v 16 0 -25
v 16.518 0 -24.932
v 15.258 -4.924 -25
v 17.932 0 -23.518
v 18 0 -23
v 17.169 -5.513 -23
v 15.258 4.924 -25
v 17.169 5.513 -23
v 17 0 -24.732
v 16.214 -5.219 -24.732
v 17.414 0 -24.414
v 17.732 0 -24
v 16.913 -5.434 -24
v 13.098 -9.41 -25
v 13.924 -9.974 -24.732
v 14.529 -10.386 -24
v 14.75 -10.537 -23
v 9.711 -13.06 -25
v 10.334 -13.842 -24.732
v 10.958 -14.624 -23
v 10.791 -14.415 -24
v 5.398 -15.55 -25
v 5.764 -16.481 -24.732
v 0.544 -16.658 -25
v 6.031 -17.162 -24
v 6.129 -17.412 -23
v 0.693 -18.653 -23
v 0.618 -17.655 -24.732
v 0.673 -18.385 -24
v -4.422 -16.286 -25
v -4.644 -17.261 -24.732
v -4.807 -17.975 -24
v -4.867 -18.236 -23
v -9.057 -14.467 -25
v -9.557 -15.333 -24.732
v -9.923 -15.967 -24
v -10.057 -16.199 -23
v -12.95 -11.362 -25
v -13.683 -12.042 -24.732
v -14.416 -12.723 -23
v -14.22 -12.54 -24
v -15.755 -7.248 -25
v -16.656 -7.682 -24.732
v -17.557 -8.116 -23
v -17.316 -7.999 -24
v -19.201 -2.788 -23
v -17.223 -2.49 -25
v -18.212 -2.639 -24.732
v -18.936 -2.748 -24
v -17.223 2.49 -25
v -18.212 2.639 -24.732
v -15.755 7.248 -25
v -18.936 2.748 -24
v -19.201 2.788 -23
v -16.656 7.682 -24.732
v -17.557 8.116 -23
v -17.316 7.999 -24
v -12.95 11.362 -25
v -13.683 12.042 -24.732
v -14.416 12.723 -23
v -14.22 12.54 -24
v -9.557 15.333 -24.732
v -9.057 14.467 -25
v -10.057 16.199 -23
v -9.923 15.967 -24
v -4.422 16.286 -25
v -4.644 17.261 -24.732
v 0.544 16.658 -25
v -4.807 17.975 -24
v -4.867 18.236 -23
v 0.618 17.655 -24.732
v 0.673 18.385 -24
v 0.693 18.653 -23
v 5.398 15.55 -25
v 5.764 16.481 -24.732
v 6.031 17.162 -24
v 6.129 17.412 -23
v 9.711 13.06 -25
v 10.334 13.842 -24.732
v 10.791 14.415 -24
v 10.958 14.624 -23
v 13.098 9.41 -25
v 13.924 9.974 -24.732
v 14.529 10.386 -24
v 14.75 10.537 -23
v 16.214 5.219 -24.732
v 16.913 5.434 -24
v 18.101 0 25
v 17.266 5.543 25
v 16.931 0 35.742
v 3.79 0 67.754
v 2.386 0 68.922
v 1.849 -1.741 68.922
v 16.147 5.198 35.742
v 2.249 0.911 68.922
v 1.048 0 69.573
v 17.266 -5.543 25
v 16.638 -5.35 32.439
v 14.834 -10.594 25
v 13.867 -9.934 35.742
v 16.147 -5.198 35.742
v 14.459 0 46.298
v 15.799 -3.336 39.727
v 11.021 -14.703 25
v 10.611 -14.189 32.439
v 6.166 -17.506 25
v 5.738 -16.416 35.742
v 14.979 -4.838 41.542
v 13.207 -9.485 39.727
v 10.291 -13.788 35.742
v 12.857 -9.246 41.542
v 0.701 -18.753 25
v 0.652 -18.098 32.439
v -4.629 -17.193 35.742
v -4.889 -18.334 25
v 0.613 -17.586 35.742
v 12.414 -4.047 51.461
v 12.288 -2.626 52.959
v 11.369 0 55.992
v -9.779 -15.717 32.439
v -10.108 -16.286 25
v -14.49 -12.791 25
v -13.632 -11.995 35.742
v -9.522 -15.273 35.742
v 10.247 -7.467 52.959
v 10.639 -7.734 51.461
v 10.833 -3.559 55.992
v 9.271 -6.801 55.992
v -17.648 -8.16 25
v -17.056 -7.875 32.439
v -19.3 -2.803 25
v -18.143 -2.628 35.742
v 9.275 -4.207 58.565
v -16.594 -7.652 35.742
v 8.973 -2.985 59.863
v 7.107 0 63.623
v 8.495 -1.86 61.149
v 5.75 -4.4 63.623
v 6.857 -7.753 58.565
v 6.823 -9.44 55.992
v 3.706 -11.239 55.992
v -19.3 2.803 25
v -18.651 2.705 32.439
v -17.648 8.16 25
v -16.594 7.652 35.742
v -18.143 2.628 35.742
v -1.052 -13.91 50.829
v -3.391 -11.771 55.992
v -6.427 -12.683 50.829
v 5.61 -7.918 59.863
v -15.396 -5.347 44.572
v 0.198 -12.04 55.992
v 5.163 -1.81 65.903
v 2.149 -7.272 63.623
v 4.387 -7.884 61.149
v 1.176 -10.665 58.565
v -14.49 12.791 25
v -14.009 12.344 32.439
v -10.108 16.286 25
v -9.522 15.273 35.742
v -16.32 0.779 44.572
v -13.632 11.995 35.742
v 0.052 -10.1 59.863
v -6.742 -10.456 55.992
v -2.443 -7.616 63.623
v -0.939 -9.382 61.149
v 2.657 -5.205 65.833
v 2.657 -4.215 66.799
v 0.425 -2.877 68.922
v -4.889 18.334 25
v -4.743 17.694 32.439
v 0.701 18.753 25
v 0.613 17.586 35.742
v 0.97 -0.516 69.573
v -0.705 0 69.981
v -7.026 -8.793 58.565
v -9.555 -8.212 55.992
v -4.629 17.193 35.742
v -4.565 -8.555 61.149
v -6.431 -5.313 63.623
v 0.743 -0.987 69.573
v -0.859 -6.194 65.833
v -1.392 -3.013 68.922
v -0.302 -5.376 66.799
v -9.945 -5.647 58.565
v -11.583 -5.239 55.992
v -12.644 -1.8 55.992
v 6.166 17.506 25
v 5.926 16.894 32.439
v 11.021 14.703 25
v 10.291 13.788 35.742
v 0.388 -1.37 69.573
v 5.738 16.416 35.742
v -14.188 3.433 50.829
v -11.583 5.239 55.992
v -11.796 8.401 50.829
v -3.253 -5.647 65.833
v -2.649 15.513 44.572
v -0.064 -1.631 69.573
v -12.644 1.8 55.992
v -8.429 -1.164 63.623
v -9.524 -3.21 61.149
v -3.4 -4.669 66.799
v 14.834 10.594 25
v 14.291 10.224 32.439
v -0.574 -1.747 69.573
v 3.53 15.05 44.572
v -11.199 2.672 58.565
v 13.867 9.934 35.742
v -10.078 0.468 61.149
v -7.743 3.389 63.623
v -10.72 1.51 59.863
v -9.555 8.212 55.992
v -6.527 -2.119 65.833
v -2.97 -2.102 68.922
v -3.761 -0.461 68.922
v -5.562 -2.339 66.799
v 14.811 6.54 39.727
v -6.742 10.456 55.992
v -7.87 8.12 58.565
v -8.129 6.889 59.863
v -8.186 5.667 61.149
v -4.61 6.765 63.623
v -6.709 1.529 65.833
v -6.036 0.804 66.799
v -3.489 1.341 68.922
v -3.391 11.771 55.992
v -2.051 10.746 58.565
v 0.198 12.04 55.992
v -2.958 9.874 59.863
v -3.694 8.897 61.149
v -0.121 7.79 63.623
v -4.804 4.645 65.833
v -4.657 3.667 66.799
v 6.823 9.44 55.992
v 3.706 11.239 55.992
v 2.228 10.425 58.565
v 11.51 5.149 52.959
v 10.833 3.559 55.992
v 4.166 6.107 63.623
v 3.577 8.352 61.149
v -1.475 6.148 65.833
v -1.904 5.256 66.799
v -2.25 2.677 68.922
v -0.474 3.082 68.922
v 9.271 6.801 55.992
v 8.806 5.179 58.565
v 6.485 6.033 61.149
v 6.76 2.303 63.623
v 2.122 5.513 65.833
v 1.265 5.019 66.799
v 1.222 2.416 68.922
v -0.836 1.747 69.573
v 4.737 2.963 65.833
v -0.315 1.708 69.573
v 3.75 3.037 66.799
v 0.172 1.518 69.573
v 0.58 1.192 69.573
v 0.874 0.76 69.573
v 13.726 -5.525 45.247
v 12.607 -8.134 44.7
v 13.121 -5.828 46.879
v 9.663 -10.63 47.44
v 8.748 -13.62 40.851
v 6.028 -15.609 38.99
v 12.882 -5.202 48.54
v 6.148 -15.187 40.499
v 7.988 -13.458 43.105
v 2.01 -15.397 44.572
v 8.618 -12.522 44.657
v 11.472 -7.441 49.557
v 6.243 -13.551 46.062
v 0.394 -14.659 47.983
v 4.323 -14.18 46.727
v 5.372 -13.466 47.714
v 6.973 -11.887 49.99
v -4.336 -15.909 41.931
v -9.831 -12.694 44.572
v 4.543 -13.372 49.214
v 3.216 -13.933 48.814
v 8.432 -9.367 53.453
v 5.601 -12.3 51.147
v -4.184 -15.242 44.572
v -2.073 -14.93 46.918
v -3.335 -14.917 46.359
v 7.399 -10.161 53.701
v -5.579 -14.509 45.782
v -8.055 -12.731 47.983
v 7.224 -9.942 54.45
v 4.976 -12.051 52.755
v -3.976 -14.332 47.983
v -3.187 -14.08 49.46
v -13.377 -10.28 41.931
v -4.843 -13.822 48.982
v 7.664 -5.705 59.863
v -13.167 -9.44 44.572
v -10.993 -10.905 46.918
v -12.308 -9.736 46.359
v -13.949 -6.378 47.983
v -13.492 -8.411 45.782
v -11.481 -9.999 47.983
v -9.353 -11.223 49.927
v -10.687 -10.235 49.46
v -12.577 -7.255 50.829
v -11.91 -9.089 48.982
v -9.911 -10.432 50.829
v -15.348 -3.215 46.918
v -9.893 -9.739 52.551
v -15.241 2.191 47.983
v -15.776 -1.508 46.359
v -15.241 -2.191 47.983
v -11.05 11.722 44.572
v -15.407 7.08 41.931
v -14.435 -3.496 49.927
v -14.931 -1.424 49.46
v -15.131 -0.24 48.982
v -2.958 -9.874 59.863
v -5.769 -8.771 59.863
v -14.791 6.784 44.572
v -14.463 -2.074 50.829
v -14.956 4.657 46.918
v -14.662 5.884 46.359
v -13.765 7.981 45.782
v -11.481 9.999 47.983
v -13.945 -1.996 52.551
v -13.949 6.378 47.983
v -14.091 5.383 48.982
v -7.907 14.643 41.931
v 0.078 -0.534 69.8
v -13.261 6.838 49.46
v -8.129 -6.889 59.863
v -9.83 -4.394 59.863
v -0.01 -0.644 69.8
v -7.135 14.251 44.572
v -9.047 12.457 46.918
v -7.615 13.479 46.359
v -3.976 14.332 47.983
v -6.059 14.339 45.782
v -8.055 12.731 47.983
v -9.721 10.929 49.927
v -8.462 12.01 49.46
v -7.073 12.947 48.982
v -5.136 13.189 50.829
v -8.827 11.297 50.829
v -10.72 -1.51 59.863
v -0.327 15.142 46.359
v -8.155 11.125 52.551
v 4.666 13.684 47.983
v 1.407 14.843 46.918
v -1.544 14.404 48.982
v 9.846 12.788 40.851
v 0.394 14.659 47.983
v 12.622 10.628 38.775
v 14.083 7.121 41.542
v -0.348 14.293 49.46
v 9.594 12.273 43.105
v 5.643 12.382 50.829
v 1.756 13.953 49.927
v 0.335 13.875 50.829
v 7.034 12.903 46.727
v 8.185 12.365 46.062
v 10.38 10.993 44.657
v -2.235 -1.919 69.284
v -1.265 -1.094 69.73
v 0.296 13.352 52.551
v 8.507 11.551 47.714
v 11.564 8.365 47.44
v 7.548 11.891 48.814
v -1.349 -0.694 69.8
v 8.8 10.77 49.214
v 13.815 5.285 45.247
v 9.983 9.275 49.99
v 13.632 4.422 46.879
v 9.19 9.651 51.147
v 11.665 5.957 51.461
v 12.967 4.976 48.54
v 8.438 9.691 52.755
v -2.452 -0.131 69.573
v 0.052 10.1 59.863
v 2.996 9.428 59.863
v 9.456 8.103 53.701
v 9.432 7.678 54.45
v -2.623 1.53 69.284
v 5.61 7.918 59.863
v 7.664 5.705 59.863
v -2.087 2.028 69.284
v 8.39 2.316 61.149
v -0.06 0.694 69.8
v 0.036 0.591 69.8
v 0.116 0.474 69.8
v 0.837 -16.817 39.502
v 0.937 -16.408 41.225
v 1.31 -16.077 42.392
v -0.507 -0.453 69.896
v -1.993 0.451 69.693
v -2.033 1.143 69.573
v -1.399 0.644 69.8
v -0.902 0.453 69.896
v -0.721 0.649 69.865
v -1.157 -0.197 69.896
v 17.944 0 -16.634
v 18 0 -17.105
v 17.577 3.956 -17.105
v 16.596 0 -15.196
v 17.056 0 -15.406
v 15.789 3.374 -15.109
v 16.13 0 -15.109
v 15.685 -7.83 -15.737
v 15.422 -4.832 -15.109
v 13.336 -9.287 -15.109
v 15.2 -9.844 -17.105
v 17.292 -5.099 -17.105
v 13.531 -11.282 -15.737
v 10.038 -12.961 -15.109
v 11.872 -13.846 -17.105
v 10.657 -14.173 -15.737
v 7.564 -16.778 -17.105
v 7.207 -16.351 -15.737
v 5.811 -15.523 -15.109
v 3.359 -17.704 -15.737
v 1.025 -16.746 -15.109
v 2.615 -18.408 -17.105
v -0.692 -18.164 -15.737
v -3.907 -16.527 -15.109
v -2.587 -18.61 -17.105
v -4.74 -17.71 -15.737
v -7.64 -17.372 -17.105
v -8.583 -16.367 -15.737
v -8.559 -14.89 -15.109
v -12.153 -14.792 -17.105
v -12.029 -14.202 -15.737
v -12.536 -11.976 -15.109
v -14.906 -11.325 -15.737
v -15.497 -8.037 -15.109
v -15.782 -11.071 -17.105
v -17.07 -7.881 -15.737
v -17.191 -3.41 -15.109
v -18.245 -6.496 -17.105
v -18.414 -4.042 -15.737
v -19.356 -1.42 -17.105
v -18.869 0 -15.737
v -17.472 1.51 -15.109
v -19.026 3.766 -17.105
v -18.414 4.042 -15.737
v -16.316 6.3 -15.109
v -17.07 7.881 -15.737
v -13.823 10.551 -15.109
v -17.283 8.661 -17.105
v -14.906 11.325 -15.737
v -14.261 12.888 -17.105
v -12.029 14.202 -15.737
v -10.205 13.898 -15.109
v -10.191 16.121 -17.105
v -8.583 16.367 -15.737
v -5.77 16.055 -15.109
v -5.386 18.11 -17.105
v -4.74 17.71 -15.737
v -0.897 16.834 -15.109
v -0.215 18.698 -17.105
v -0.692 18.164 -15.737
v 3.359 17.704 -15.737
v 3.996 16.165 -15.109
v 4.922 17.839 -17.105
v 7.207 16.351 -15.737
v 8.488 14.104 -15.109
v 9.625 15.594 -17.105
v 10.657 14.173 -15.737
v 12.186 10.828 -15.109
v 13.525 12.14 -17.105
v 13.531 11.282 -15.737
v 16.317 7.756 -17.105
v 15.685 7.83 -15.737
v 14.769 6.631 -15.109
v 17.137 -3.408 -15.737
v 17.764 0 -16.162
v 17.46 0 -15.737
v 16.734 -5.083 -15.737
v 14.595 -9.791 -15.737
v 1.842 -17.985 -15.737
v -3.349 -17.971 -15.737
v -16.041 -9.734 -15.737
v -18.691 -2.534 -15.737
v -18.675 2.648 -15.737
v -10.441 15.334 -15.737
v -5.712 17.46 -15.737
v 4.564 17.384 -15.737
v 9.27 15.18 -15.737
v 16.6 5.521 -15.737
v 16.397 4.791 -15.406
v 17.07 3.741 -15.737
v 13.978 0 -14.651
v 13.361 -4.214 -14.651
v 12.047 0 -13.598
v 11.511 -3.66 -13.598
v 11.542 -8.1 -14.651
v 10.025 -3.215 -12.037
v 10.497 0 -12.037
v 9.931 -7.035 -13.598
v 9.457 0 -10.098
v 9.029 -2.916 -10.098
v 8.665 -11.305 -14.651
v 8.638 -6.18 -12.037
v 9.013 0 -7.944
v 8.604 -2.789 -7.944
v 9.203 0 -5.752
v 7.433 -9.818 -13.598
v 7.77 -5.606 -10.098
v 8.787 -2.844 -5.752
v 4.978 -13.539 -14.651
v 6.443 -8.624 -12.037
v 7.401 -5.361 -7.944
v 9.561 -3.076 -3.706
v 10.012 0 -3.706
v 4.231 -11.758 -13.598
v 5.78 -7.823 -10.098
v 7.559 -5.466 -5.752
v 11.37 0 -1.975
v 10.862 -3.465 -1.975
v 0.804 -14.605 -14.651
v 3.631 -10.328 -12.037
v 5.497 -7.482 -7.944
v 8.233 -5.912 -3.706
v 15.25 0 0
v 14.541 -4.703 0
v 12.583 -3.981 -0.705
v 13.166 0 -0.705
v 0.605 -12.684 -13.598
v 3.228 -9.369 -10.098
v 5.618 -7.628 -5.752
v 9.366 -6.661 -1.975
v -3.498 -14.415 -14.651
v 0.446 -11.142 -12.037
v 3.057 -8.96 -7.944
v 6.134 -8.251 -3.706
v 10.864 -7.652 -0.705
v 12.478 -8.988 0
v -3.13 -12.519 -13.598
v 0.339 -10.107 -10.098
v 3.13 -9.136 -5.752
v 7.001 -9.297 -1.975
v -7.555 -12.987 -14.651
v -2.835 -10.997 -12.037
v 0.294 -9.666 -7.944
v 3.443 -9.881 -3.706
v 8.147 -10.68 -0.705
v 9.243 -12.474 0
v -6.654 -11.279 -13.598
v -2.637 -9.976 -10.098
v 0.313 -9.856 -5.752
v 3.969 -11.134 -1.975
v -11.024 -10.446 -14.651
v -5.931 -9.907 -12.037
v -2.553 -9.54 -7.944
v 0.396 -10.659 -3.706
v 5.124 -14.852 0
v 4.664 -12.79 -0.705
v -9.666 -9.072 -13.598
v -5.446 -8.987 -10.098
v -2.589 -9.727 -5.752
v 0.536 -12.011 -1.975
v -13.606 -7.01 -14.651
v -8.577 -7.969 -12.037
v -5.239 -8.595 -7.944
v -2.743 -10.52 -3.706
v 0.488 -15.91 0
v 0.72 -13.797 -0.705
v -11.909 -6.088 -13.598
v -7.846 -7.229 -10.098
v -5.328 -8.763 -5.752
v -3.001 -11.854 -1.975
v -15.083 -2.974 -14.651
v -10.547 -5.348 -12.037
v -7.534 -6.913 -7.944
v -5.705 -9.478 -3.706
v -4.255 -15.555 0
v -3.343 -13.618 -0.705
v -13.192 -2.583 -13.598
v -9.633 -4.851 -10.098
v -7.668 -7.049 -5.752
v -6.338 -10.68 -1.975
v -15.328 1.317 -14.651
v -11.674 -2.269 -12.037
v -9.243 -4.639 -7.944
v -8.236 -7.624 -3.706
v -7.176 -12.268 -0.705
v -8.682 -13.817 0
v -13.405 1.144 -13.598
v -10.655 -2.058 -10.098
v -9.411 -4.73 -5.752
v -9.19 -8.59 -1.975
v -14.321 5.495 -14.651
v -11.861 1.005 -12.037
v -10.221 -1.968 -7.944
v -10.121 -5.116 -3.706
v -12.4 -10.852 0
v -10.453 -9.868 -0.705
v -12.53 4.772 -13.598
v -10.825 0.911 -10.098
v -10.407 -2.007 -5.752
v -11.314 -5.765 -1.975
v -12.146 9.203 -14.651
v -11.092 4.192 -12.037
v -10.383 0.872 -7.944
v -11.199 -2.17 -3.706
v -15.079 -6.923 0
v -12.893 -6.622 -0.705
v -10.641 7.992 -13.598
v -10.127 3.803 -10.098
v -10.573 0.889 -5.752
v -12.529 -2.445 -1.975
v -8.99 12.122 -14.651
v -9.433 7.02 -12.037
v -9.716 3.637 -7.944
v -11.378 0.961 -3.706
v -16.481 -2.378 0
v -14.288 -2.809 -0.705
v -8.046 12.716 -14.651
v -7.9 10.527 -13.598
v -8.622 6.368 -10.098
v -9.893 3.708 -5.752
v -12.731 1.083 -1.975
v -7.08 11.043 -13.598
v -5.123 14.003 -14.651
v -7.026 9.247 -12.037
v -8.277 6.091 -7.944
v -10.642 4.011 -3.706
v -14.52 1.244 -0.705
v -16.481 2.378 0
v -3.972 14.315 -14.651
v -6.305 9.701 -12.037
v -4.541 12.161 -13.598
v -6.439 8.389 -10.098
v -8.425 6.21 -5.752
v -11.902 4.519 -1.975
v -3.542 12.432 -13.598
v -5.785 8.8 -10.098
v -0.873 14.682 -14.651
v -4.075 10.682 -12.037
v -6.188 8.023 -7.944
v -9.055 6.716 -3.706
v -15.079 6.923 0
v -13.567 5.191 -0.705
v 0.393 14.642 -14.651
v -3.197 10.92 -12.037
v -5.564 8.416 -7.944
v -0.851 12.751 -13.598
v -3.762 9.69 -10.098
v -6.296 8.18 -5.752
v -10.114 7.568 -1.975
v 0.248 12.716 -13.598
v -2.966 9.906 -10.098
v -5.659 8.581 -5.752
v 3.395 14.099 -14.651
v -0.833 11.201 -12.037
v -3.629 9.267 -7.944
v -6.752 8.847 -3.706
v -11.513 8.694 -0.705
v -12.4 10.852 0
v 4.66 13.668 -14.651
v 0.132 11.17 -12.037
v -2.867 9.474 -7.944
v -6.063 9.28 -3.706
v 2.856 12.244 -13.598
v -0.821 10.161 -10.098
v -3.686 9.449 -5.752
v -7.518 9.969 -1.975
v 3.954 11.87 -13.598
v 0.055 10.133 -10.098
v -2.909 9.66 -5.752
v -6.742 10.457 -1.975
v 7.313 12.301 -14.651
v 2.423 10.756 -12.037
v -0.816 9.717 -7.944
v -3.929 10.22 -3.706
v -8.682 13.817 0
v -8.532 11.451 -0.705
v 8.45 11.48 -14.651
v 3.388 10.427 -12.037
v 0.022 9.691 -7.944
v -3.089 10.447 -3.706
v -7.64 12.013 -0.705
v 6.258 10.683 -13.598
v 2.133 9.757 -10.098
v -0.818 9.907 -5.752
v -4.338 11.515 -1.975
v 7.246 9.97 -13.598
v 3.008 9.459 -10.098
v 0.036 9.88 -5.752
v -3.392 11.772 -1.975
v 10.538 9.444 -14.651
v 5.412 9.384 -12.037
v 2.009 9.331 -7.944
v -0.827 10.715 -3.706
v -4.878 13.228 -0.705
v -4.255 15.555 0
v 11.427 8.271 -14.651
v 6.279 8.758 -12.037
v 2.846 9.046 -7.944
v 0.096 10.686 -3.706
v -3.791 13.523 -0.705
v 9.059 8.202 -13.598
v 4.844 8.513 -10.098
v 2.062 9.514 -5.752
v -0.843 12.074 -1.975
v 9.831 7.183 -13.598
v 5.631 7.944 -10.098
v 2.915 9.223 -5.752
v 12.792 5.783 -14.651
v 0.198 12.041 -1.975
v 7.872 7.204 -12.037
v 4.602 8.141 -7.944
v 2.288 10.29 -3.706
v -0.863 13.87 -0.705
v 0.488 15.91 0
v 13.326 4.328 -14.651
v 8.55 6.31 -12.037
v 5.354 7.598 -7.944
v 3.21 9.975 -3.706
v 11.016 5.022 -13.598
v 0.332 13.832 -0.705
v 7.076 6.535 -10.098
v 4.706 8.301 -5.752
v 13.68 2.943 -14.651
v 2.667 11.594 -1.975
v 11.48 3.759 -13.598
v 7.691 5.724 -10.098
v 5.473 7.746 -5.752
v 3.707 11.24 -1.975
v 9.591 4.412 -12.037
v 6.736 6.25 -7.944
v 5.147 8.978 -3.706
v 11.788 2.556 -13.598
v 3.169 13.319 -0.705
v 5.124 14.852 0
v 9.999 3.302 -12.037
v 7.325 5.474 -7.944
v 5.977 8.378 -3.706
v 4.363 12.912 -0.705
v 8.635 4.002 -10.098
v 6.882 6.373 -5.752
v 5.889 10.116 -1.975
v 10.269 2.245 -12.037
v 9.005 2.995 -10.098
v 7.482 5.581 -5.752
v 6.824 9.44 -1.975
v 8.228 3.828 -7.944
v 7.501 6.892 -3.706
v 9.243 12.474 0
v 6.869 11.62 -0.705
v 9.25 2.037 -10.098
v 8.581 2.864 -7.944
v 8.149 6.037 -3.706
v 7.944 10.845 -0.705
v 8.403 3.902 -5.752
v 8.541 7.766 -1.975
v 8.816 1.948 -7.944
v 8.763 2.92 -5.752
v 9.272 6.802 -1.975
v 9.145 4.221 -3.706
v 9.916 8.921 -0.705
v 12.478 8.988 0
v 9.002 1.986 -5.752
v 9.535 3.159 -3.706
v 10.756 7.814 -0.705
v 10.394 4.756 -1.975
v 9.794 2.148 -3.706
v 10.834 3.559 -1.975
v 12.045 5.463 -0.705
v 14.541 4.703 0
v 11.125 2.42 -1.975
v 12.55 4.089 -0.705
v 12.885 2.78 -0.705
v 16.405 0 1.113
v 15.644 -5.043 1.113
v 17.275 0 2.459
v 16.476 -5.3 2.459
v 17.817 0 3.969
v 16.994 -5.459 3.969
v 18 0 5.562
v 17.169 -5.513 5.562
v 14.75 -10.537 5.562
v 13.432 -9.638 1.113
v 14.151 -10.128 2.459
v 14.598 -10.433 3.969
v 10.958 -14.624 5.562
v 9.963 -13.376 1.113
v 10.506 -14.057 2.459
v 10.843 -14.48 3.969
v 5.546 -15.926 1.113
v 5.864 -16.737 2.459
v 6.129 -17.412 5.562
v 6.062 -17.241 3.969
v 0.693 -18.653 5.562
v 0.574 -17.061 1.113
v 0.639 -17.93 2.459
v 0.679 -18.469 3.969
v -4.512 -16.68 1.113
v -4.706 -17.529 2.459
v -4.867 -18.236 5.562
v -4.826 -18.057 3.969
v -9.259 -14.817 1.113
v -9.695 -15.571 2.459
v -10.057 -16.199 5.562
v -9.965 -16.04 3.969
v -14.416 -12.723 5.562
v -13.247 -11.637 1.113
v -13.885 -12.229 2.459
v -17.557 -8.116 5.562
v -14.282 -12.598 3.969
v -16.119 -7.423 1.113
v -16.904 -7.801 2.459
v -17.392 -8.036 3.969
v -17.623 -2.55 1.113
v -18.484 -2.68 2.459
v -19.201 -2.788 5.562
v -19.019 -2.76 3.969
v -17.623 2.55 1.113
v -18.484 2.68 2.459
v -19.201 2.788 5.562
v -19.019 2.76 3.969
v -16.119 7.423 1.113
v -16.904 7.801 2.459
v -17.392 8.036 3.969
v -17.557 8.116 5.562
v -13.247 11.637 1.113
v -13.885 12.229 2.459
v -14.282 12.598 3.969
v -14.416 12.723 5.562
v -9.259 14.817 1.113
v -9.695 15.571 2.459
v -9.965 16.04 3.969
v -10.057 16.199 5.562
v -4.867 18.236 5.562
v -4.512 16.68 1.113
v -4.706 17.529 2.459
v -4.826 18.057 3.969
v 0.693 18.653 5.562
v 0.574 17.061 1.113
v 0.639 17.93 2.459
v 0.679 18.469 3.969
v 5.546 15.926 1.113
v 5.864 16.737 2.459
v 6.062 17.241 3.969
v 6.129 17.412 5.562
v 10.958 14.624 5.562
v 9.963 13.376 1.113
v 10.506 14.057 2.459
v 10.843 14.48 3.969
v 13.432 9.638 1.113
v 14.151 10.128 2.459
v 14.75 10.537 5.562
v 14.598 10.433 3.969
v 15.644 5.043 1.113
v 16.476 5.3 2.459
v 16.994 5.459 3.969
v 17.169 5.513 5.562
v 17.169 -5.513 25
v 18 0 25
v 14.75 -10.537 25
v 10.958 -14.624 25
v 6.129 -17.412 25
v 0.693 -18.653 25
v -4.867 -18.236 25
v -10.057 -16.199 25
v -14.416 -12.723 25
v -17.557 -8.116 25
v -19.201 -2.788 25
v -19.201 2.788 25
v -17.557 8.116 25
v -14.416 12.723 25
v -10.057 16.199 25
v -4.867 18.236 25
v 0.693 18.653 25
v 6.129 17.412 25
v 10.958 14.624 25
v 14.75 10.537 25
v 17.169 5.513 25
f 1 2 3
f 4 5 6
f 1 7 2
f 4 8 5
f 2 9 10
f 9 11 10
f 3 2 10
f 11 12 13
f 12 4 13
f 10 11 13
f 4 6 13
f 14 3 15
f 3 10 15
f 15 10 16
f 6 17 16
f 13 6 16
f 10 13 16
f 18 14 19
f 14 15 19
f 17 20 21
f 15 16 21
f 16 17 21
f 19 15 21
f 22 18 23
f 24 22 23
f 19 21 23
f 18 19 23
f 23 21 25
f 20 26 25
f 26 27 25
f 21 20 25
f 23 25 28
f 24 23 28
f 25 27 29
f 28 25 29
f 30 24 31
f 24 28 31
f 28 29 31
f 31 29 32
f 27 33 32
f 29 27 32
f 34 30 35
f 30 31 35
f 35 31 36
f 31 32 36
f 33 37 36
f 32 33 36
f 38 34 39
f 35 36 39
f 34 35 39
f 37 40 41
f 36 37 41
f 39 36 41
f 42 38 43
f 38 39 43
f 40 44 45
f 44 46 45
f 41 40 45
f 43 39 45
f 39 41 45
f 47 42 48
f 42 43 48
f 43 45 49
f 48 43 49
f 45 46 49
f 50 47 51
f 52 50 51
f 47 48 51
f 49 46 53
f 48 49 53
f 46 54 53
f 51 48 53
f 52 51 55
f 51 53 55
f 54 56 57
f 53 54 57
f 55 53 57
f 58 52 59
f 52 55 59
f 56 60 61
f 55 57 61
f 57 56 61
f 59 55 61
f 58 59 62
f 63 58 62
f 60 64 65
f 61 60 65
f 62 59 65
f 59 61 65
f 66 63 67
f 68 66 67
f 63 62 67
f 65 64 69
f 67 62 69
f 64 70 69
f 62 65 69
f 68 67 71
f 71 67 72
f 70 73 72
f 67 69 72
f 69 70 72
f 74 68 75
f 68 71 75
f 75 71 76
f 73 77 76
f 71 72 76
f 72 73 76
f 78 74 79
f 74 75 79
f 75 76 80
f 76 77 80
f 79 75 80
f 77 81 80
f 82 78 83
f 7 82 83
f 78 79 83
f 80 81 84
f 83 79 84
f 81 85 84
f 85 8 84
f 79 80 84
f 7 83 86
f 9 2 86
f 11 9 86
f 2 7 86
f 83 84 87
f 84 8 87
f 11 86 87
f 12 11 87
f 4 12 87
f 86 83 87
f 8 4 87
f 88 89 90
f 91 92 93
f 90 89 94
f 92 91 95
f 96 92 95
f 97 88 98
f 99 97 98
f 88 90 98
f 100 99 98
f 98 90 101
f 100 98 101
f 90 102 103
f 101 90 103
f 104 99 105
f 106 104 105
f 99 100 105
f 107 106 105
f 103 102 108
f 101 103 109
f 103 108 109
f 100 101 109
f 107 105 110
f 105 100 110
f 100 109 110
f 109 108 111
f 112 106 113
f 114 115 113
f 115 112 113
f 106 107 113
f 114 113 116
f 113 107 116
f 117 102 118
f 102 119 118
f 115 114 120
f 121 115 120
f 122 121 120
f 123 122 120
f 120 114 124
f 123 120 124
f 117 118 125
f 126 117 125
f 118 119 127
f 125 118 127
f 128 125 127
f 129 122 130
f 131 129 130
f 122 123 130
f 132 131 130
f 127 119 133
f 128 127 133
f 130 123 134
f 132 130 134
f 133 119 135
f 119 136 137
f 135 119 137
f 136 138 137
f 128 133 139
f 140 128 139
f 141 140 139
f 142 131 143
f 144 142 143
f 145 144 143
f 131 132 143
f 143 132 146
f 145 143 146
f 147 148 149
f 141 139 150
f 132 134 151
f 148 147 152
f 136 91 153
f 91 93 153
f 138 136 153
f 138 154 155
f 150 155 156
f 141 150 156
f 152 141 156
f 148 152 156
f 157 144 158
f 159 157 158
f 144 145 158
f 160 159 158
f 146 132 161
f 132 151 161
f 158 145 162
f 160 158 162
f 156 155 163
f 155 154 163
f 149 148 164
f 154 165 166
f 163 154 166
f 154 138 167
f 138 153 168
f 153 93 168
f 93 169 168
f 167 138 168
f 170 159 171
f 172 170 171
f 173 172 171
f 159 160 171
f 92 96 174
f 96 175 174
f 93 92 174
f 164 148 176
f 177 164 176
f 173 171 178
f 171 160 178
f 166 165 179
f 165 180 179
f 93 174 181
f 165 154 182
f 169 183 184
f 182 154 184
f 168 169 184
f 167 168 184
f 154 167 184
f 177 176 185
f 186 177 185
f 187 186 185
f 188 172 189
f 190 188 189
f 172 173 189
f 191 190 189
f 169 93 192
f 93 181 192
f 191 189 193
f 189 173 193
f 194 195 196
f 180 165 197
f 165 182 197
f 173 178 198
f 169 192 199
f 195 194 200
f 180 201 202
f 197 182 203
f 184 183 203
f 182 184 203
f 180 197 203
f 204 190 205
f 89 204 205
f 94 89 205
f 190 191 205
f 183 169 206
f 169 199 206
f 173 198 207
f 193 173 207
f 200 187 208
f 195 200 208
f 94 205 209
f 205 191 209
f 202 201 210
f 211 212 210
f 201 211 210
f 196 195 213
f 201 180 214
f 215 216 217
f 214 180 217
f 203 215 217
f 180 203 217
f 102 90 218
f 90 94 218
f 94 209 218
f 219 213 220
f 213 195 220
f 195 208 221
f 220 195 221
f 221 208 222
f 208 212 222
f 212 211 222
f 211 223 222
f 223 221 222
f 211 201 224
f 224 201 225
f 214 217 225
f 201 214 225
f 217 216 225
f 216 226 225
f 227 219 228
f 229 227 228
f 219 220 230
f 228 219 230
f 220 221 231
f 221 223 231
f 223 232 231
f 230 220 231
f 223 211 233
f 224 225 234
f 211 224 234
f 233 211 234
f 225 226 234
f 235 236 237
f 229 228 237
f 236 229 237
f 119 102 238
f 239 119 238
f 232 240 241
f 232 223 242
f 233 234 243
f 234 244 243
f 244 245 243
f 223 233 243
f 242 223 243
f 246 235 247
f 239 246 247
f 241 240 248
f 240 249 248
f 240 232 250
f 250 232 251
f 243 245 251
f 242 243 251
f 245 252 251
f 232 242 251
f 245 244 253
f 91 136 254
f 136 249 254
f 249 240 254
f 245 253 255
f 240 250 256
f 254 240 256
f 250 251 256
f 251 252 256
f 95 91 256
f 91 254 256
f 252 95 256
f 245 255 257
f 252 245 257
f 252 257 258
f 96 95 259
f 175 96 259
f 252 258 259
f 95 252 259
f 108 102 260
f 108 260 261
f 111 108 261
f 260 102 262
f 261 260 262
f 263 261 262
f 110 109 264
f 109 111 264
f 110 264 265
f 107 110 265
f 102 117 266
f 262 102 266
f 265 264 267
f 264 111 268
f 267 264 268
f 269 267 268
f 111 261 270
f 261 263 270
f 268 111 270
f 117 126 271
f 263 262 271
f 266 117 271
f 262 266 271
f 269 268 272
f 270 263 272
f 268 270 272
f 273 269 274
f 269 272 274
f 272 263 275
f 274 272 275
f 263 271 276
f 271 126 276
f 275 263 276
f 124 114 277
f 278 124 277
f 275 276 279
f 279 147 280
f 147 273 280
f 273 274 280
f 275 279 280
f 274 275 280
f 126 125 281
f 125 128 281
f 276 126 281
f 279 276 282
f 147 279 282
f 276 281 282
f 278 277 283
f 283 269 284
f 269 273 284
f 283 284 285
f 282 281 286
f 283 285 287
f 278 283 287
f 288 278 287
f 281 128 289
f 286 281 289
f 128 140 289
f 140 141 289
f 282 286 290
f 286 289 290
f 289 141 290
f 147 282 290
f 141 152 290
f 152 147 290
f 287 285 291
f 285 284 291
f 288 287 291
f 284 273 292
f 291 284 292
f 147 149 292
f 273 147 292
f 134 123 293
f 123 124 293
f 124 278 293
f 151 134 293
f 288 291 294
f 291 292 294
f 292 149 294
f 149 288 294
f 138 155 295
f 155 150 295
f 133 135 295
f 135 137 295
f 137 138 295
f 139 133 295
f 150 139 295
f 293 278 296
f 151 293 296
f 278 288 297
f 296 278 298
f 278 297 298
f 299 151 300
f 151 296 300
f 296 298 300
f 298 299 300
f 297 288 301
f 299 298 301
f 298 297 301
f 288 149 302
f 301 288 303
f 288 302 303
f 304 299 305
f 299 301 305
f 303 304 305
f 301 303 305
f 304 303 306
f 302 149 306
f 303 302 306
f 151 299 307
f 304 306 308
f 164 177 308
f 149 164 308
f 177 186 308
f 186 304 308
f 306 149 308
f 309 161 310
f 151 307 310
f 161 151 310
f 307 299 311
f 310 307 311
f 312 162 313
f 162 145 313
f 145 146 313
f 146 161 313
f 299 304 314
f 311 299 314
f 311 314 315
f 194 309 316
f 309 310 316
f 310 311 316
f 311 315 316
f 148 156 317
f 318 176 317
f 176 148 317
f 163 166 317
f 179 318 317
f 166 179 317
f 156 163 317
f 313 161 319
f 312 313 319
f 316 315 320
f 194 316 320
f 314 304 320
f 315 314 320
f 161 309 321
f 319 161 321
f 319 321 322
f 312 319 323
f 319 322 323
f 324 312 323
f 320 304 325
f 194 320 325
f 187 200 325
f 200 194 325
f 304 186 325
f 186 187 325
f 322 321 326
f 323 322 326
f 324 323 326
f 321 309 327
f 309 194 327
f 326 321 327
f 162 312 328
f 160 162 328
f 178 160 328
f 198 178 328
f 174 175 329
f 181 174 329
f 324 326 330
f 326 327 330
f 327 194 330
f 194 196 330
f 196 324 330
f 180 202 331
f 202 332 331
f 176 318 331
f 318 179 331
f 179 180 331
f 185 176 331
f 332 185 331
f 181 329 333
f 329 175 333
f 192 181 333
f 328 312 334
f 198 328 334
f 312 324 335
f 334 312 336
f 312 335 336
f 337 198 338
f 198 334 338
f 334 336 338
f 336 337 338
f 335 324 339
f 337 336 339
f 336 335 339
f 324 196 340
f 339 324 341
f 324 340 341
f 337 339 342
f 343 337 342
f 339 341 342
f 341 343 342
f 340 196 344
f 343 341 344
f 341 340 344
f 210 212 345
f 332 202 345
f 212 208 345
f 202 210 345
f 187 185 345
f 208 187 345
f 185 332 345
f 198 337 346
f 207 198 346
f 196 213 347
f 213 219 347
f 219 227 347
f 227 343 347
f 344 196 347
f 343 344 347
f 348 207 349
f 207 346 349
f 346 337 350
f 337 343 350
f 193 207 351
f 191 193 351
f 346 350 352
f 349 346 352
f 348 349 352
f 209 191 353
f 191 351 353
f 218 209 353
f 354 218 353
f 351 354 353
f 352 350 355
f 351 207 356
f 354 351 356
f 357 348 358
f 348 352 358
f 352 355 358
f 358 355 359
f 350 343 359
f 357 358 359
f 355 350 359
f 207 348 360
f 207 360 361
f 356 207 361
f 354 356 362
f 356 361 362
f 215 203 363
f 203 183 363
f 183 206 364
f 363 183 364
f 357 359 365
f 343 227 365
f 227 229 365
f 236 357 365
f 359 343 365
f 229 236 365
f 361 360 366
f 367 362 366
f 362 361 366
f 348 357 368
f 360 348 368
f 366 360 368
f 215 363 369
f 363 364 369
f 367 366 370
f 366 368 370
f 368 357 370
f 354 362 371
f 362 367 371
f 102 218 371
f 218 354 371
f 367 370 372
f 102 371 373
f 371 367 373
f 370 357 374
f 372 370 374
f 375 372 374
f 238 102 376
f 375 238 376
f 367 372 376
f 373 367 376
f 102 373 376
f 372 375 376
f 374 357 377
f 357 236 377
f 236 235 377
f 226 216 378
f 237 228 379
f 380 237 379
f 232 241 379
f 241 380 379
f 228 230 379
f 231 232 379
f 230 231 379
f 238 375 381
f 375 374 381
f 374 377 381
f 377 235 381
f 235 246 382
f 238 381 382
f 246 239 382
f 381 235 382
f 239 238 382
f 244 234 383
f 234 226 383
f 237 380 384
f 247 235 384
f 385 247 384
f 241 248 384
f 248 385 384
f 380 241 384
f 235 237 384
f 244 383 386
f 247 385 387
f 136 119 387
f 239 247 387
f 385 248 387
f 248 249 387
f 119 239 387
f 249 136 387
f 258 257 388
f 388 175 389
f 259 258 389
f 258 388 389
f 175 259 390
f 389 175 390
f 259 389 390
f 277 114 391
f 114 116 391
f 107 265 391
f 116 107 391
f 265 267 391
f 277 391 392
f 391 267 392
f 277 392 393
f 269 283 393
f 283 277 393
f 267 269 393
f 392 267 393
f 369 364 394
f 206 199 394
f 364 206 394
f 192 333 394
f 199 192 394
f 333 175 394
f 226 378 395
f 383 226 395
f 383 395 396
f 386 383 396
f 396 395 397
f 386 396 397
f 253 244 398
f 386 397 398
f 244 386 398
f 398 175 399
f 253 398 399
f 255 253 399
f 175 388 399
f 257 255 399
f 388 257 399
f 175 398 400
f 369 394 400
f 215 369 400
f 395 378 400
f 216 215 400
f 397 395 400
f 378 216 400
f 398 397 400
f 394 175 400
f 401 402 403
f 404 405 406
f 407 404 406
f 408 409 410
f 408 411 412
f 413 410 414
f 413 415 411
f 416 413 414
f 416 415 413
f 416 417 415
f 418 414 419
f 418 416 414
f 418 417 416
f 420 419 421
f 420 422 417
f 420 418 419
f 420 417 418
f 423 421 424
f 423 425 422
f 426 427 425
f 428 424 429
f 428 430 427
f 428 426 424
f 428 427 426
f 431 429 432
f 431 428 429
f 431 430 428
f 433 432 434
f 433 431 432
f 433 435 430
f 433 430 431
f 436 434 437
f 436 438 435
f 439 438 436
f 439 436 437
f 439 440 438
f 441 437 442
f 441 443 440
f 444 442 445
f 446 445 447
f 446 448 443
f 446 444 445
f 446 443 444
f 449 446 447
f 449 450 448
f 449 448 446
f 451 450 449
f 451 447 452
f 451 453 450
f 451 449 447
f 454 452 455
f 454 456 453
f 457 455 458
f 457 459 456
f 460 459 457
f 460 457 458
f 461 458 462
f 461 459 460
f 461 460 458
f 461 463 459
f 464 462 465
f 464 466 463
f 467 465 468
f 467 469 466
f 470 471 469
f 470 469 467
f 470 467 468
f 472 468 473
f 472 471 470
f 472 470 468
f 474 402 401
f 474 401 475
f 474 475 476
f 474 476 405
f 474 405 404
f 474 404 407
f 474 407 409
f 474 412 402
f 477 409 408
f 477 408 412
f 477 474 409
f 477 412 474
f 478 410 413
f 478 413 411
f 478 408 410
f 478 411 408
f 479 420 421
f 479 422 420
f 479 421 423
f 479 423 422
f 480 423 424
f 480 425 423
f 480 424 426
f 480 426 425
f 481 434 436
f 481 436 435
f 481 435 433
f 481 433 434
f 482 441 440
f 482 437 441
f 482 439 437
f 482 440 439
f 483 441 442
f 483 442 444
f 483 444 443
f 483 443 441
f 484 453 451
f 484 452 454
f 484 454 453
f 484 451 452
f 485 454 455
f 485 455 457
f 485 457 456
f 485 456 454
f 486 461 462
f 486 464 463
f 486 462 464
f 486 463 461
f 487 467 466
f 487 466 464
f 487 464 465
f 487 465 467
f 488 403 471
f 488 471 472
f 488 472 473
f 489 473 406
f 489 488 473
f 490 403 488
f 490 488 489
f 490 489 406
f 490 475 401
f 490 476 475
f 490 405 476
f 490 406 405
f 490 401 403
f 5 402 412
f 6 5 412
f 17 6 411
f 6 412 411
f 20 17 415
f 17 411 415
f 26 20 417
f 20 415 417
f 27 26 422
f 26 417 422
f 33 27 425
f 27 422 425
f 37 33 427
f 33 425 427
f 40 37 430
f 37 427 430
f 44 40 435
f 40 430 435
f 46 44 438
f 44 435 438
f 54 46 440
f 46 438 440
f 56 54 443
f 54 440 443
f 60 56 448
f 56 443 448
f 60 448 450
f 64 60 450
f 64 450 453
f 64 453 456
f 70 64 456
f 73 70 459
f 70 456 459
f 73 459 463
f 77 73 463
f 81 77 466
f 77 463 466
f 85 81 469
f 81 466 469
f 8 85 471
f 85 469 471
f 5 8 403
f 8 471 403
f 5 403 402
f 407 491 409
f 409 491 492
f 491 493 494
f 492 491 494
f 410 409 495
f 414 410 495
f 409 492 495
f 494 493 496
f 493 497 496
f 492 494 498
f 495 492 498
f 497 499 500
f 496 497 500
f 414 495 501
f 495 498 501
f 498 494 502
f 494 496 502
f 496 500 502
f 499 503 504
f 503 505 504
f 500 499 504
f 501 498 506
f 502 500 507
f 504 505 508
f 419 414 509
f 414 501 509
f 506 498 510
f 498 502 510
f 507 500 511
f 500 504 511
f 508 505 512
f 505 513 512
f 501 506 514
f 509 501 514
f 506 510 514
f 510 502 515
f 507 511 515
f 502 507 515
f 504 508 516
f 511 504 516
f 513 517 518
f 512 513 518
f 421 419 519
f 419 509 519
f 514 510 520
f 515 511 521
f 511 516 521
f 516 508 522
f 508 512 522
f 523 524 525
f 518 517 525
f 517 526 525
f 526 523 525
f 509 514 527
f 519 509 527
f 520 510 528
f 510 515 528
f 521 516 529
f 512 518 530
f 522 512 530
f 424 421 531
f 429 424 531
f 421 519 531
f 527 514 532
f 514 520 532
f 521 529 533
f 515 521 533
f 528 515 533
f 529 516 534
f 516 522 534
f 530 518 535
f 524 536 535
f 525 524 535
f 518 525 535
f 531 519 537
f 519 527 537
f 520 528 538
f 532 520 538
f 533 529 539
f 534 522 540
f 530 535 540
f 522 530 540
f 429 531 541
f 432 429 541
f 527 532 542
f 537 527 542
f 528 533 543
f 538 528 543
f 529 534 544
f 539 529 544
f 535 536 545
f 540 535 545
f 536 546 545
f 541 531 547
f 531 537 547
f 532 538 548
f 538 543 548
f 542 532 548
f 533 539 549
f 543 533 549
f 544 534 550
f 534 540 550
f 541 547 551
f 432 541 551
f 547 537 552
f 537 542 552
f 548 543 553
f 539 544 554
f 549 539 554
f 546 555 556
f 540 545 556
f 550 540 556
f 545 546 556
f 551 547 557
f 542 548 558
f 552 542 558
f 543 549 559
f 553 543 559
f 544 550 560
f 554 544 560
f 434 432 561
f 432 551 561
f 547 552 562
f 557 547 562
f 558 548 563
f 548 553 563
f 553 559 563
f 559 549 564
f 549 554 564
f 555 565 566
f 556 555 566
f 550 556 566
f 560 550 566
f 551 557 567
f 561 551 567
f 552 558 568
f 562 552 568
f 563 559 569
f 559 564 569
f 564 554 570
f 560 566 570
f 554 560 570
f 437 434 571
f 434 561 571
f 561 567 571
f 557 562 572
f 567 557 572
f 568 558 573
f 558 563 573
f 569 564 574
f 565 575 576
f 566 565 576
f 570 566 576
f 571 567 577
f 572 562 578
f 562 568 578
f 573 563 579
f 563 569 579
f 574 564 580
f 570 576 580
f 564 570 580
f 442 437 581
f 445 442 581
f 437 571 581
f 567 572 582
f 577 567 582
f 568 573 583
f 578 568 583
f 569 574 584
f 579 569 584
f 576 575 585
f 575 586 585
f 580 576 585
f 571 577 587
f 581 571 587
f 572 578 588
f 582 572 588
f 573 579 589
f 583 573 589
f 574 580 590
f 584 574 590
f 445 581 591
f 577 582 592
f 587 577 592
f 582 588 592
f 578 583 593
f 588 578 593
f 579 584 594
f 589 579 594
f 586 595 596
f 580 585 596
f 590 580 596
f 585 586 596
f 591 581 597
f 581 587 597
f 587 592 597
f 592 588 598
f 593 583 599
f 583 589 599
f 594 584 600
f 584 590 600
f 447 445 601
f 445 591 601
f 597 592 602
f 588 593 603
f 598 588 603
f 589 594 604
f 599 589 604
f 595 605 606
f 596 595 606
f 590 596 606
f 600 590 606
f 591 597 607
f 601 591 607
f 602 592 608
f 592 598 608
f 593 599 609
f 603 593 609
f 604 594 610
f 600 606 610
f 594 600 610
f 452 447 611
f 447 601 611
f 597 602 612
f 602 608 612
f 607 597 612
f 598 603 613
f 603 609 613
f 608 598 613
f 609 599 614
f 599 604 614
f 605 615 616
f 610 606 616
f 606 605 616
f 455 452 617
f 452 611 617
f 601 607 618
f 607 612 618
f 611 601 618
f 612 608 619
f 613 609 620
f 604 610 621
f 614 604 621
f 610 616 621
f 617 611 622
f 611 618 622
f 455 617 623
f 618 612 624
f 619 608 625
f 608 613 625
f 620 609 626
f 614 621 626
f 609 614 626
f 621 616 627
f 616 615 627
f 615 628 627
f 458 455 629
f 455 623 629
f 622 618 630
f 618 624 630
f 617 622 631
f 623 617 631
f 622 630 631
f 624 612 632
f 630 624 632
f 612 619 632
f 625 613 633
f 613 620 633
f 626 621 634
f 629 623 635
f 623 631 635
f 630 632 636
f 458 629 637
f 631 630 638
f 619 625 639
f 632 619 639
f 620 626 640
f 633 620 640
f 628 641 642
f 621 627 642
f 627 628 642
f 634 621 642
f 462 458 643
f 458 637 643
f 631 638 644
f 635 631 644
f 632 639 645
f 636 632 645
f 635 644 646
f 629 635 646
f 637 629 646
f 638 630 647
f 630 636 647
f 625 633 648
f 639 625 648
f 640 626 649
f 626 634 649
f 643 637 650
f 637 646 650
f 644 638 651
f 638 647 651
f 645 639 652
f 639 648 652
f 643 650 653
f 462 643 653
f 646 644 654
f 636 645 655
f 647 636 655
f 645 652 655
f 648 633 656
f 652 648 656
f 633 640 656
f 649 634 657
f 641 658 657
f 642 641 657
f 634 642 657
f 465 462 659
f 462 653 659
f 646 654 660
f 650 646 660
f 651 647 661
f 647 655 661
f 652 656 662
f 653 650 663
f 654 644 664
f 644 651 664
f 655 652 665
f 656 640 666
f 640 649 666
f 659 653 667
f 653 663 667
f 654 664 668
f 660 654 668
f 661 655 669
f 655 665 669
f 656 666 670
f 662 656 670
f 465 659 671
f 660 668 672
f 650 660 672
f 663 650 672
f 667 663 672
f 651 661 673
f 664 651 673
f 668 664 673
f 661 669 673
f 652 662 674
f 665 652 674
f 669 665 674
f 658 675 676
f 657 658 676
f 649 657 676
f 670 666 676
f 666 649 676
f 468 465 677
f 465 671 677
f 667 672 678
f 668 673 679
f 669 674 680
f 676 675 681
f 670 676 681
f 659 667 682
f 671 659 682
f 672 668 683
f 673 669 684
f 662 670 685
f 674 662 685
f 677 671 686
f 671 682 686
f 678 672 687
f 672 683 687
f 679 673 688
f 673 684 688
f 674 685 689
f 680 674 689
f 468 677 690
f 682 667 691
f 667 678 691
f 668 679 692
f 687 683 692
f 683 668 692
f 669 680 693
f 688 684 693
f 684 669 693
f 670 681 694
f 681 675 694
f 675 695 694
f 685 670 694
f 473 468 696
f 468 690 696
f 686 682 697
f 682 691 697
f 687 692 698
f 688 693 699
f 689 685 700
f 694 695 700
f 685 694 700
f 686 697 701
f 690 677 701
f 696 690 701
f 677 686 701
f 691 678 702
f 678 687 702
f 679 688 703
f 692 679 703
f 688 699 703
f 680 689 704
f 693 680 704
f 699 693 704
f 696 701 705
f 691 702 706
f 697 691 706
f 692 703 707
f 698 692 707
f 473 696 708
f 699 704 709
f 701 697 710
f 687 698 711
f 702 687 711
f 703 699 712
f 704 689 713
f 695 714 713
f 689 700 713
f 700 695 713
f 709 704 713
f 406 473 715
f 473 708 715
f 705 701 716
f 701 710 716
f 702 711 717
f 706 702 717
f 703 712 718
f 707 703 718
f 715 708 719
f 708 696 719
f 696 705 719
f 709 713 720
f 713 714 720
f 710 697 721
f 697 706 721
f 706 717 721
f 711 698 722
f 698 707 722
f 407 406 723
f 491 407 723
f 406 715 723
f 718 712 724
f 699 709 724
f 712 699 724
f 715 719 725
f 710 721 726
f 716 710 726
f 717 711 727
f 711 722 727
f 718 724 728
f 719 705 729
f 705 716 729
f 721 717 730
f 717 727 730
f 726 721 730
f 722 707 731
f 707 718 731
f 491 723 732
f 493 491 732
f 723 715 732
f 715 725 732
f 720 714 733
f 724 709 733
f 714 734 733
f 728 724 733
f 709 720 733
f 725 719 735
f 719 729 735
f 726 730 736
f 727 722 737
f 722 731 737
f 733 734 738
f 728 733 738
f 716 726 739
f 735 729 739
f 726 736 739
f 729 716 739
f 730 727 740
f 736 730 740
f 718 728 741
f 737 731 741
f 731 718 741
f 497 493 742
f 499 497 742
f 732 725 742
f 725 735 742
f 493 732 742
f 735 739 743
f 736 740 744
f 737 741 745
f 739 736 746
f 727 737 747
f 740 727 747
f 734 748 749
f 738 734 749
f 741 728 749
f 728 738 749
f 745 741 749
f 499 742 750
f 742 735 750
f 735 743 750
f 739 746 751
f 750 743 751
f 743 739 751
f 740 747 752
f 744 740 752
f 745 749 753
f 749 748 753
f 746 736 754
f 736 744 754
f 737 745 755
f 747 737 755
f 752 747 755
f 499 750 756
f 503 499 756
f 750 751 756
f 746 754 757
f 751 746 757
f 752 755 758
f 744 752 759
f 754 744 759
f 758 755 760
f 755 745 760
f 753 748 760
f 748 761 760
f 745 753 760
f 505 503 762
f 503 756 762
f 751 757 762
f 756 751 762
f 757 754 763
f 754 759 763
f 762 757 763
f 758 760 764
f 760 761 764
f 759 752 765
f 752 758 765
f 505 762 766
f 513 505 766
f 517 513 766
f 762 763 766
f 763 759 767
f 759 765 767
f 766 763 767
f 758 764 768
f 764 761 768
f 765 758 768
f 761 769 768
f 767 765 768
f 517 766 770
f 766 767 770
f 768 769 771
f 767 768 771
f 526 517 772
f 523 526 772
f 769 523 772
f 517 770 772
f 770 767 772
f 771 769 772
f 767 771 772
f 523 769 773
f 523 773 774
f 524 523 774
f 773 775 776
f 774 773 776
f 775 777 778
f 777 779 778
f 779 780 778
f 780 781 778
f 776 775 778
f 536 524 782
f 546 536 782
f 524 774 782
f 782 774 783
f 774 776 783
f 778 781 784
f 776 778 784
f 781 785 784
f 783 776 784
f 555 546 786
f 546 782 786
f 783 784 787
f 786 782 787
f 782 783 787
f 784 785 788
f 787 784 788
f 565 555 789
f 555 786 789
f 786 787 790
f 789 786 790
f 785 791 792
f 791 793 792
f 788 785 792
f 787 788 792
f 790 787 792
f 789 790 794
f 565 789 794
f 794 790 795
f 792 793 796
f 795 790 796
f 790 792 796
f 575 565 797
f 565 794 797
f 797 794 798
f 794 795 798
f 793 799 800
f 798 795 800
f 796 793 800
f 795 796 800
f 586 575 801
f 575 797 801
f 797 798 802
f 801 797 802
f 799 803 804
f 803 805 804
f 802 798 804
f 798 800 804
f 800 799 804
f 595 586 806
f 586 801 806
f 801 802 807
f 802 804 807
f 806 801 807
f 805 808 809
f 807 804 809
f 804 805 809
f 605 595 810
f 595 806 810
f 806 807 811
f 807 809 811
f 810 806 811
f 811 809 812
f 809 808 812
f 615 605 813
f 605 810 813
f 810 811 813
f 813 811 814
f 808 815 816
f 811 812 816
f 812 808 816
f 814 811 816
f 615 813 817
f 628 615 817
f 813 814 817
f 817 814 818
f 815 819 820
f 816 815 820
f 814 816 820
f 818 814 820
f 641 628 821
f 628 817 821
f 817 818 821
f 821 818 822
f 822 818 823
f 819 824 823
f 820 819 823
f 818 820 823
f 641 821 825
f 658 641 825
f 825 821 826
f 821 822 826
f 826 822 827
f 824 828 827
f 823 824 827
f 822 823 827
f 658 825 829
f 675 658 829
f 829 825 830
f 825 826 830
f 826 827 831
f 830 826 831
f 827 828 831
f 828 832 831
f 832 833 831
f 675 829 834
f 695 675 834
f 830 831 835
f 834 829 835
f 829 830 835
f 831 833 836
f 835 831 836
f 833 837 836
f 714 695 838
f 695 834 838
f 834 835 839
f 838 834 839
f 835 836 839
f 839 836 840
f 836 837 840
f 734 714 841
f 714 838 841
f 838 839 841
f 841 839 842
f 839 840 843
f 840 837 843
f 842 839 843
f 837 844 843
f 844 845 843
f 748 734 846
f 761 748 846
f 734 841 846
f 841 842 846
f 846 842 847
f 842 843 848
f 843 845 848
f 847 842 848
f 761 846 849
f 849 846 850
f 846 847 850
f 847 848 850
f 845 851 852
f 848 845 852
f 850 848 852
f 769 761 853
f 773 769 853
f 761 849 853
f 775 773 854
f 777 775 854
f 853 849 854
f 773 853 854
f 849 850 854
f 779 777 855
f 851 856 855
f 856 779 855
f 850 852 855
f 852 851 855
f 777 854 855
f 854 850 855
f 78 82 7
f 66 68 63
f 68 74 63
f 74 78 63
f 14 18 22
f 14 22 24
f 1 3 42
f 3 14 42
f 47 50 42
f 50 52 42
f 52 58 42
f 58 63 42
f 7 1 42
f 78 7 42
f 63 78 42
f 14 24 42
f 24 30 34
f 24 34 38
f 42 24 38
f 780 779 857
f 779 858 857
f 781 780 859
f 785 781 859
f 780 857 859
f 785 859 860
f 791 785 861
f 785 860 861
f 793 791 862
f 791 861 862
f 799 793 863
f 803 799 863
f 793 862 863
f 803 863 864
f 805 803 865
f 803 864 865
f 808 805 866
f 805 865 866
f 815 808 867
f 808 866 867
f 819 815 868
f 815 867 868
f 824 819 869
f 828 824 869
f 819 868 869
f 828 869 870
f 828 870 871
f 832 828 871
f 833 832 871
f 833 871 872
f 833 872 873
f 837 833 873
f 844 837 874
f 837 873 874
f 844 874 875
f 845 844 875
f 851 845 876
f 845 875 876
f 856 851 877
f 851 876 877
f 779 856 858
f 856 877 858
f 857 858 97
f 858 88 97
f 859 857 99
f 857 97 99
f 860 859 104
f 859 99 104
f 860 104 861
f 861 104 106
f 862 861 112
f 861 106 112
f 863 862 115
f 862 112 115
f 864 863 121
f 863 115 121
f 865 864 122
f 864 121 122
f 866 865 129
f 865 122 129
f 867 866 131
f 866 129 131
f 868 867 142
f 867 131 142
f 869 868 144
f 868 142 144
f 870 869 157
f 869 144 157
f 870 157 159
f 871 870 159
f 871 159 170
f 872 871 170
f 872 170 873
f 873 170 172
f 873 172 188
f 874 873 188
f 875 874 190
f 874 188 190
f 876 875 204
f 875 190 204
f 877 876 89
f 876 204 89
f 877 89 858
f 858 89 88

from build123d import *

# Parameters (mm, degrees)
F2_R = 2


# Not quite as in the source:
# - a fillet or chamfer that OpenCascade refuses, or shapes differently, is made with other operations: its cross-section is extruded or revolved along the edge and cut away or added


with BuildPart() as f1:
    # F0 (on Front) → F1 (revolve)
    with BuildSketch(Plane.XZ):
        with BuildLine():
            Line((18.000271342, 25.0001516185), (18.1012638153, 24.9997436393))
            add(Edge.make_bspline(
                [(18.1012638153, 24.9997436393), (17.6719067295, 35.095470957), (14.2496345804, 46.7589173288), (12.2347602329, 54.7595156146), (7.9244531632, 62.8468989209), (3.3477119391, 68.6841172693), (1.1088911486, 69.6972383356), (-0.7046223968, 69.9807515456)],
                knots=[0, 0, 0, 0, 0.3127125194, 0.4947905771, 0.691957332, 0.8656901327, 1, 1, 1, 1], degree=3))
            Line((-0.7046223968, 69.9807515456), (-0.7046223968, 25.0757137578))
            Line((-0.7046223968, 25.0757137578), (18.000271342, 25.0757137578))
            Line((18.000271342, 25.0757137578), (18.000271342, 25.0001516185))
        make_face()
        with BuildLine():
            Line((18.000271342, -0.0002563607), (18.000271342, 25.0001516185))
            Line((18.000271342, 25.0001516185), (-0.7046223968, 25.0757137578))
            Line((-0.7046223968, 25.0757137578), (-0.7046223968, 0))
            Line((-0.7046223968, 0), (-0.7046223968, -0.0002563607))
            Line((-0.7046223968, -0.0002563607), (15.250271342, -0.0002563607))
            ThreePointArc((15.250271342, -0.0002563607), (16.625271342, 0.1247436393), (18.000271342, -0.0002563607))
        make_face()
        Polygon((-0.7046223968, 25.0757137578), (18.000271342, 25.0001516185), (18.000271342, 25.0757137578), align=None)
        with BuildLine():
            Line((15.250271342, -0.0002563607), (18.000271342, -0.0002563607))
            ThreePointArc((18.000271342, -0.0002563607), (16.625271342, 0.1247436393), (15.250271342, -0.0002563607))
        make_face()
        with BuildLine():
            ThreePointArc((18.000271342, -15.0002563607), (9.125271342, -8.8752563607), (15.250271342, -0.0002563607))
            Line((15.250271342, -0.0002563607), (-0.7046223968, -0.0002563607))
            Line((-0.7046223968, -0.0002563607), (-0.7046223968, -25.0002563607))
            Line((-0.7046223968, -25.0002563607), (18.000271342, -25.0002563607))
            Line((18.000271342, -25.0002563607), (18.000271342, -15.0002563607))
        make_face()
    revolve(axis=Axis((-0.7046223968, 0, 47.5282326517), (0, 0, -1)))

    # F2
    f2_edges = [f1.edges().sort_by_distance(p)[0] for p in [
        (-19.409516, 0, -15.000256),
        (-19.409516, 0, -25.000256),
    ]]
    fillet(f2_edges, radius=F2_R)

    # F3: fillet of radius 7 on 1 edges, made by hand

    # F3_s1 → F3_t2 (revolve, cut)
    with BuildSketch(Plane.XZ):
        with BuildLine():
            ThreePointArc((15.250271342, -0.0002563607), (17.275221541, 2.4594740932), (18.000271342, 5.5618925047))
            Line((18.000271342, 5.5618925047), (18.000271342, -0.0002563607))
            Line((18.000271342, -0.0002563607), (15.250271342, -0.0002563607))
        make_face()
    revolve(axis=Axis((-0.7046223968, 0, -0.0002563607), (0, 0, -1)), mode=Mode.SUBTRACT)


solid = f1.part
